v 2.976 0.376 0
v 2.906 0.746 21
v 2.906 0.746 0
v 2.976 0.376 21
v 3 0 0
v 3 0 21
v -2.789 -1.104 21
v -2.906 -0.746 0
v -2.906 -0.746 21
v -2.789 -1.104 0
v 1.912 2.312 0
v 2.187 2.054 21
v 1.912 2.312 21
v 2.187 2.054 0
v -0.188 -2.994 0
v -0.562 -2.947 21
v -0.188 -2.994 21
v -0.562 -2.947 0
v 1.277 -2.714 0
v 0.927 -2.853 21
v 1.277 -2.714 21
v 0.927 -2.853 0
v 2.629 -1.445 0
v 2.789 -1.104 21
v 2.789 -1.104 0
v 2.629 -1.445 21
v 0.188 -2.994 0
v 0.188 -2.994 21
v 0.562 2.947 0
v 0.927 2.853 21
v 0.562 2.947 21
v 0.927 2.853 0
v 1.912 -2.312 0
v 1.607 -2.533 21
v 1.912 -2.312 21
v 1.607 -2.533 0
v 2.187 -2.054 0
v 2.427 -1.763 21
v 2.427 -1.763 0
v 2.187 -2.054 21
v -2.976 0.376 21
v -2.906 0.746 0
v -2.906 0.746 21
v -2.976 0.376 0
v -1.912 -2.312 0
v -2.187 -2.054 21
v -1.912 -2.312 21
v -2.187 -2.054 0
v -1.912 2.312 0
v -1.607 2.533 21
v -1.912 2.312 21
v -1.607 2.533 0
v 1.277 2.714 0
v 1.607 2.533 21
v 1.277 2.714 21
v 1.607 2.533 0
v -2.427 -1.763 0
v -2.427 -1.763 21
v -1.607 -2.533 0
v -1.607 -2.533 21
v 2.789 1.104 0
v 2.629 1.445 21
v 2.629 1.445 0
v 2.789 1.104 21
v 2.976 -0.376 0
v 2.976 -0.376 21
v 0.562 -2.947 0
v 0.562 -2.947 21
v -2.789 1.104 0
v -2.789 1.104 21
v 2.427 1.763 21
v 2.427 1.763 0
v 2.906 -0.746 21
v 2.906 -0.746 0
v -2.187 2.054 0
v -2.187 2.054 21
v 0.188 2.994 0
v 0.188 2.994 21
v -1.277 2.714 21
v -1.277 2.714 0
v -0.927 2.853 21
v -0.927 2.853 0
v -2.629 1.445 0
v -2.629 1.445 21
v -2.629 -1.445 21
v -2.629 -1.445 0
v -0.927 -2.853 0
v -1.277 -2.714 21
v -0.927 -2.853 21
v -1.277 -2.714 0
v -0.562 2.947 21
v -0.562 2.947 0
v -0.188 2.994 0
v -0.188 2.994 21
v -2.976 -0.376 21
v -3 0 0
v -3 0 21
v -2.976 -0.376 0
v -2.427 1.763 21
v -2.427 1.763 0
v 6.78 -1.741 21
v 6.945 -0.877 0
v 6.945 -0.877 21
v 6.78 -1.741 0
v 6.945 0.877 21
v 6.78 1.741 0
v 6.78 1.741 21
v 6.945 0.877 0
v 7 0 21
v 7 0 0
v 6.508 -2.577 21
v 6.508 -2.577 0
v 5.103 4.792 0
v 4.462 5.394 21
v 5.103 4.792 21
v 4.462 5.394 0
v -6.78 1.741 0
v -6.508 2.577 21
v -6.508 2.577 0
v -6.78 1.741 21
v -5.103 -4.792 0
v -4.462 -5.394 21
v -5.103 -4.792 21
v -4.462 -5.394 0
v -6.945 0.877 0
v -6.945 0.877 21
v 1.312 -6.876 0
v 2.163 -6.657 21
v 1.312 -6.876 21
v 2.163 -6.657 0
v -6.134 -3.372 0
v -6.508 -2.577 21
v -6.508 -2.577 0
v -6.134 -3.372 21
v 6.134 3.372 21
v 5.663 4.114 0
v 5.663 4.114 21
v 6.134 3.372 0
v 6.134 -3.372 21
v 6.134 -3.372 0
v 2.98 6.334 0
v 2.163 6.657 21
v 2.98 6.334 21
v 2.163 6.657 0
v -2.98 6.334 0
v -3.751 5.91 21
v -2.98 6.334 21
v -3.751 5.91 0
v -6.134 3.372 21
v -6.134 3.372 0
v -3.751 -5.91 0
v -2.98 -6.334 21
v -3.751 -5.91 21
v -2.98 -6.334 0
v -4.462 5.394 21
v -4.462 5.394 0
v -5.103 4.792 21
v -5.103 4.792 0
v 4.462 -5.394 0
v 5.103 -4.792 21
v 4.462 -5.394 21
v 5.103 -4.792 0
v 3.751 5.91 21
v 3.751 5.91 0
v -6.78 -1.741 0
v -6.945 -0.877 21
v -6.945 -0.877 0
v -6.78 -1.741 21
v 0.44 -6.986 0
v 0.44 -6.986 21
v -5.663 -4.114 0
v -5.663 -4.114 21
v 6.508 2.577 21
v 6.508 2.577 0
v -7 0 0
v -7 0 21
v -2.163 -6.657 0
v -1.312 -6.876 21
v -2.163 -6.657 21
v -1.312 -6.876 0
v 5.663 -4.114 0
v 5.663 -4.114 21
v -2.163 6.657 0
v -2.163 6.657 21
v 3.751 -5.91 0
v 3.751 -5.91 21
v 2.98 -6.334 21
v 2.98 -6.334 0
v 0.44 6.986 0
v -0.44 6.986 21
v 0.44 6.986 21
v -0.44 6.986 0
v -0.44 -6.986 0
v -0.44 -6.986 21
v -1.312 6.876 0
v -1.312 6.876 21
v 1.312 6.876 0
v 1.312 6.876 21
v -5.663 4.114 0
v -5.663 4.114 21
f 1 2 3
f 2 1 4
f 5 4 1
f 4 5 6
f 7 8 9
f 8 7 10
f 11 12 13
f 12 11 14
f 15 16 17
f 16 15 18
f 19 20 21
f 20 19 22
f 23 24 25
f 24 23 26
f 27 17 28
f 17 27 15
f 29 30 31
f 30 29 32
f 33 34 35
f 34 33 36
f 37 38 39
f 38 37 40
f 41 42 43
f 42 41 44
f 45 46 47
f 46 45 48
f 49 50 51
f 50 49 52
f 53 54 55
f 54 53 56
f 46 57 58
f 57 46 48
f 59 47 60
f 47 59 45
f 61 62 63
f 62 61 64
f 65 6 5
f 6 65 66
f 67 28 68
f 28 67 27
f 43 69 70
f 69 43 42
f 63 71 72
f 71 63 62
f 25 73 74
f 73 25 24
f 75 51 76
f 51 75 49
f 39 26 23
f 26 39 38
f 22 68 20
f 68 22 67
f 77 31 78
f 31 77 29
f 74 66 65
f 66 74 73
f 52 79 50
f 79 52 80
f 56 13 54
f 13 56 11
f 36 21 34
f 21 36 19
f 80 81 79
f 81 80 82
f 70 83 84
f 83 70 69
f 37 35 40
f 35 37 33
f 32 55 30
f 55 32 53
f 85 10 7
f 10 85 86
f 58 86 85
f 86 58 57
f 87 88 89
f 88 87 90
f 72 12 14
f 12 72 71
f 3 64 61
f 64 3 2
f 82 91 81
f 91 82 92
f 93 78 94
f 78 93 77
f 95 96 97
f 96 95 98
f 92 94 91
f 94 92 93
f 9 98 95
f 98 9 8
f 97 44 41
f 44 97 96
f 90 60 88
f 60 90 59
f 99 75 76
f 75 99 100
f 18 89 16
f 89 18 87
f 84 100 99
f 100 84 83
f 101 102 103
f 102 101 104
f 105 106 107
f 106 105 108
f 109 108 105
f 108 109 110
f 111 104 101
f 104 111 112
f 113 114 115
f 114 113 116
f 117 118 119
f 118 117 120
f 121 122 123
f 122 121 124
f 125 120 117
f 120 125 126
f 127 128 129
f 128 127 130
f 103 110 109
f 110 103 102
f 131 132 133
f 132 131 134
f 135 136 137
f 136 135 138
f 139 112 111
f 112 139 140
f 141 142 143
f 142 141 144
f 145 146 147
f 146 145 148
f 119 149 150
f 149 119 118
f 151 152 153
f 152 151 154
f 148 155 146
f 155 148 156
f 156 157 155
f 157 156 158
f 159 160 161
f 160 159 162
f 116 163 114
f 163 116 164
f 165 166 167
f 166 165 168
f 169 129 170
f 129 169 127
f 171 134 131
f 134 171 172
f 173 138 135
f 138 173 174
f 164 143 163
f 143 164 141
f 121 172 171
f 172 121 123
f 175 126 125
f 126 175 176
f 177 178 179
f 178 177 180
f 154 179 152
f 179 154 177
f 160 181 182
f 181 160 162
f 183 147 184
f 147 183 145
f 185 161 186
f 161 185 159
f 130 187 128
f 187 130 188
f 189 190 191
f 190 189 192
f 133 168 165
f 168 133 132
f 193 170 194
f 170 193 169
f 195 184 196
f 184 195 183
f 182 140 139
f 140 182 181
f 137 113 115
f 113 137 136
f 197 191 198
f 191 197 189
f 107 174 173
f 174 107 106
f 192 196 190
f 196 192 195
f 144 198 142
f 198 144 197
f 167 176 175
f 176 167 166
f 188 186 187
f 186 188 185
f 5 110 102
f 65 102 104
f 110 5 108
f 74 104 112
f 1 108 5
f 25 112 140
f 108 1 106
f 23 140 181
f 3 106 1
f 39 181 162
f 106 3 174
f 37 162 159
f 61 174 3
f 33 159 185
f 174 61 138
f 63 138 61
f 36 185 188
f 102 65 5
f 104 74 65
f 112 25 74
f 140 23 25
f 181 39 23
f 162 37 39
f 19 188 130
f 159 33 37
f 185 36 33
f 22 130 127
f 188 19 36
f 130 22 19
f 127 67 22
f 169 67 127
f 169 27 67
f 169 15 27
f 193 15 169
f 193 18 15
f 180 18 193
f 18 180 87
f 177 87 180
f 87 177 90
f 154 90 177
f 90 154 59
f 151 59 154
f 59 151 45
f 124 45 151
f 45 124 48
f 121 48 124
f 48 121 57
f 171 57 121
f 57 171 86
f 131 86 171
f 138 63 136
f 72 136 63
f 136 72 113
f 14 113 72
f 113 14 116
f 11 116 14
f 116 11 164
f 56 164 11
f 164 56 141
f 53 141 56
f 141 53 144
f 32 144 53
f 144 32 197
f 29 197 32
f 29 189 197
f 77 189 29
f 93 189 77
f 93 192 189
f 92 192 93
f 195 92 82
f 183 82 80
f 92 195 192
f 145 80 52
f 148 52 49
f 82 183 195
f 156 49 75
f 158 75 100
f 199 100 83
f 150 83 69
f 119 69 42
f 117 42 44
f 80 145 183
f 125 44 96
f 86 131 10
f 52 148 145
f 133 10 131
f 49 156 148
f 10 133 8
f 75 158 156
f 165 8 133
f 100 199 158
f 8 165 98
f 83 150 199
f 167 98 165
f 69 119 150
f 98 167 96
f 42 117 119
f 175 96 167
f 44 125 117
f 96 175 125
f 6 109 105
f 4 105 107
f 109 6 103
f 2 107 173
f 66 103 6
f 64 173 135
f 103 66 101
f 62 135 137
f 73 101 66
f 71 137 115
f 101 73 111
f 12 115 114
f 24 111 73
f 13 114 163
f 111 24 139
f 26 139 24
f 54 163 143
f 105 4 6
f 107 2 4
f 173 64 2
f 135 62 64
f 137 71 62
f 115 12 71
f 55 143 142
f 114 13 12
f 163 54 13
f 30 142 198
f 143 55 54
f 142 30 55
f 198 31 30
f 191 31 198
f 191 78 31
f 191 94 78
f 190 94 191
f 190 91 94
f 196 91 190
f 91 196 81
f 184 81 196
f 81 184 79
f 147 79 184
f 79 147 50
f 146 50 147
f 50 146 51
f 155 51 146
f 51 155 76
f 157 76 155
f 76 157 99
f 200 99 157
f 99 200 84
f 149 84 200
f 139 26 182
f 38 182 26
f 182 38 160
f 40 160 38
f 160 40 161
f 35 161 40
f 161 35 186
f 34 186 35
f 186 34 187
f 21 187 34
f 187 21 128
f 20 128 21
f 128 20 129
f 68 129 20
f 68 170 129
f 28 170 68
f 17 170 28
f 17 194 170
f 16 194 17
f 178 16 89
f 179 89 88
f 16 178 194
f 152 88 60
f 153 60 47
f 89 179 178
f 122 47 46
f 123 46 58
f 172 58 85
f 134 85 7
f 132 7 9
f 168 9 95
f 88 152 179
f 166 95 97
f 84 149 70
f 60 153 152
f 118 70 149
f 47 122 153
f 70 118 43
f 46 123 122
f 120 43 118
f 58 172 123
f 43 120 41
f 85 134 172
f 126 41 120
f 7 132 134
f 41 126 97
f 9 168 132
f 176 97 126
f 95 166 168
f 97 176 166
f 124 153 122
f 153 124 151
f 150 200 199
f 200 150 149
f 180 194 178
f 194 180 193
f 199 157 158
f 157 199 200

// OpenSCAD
$fn = 50;

difference() {
	union() {
		cylinder(h = 21, r = 7.0);
	}
	union() {
		translate(v = [0, 0, -100]) {
			cylinder(h = 200, r = 3.0);
		}
		translate(v = [0, 0, -100]) {
			cylinder(h = 200, r = 1.5);
		}
	}
}
